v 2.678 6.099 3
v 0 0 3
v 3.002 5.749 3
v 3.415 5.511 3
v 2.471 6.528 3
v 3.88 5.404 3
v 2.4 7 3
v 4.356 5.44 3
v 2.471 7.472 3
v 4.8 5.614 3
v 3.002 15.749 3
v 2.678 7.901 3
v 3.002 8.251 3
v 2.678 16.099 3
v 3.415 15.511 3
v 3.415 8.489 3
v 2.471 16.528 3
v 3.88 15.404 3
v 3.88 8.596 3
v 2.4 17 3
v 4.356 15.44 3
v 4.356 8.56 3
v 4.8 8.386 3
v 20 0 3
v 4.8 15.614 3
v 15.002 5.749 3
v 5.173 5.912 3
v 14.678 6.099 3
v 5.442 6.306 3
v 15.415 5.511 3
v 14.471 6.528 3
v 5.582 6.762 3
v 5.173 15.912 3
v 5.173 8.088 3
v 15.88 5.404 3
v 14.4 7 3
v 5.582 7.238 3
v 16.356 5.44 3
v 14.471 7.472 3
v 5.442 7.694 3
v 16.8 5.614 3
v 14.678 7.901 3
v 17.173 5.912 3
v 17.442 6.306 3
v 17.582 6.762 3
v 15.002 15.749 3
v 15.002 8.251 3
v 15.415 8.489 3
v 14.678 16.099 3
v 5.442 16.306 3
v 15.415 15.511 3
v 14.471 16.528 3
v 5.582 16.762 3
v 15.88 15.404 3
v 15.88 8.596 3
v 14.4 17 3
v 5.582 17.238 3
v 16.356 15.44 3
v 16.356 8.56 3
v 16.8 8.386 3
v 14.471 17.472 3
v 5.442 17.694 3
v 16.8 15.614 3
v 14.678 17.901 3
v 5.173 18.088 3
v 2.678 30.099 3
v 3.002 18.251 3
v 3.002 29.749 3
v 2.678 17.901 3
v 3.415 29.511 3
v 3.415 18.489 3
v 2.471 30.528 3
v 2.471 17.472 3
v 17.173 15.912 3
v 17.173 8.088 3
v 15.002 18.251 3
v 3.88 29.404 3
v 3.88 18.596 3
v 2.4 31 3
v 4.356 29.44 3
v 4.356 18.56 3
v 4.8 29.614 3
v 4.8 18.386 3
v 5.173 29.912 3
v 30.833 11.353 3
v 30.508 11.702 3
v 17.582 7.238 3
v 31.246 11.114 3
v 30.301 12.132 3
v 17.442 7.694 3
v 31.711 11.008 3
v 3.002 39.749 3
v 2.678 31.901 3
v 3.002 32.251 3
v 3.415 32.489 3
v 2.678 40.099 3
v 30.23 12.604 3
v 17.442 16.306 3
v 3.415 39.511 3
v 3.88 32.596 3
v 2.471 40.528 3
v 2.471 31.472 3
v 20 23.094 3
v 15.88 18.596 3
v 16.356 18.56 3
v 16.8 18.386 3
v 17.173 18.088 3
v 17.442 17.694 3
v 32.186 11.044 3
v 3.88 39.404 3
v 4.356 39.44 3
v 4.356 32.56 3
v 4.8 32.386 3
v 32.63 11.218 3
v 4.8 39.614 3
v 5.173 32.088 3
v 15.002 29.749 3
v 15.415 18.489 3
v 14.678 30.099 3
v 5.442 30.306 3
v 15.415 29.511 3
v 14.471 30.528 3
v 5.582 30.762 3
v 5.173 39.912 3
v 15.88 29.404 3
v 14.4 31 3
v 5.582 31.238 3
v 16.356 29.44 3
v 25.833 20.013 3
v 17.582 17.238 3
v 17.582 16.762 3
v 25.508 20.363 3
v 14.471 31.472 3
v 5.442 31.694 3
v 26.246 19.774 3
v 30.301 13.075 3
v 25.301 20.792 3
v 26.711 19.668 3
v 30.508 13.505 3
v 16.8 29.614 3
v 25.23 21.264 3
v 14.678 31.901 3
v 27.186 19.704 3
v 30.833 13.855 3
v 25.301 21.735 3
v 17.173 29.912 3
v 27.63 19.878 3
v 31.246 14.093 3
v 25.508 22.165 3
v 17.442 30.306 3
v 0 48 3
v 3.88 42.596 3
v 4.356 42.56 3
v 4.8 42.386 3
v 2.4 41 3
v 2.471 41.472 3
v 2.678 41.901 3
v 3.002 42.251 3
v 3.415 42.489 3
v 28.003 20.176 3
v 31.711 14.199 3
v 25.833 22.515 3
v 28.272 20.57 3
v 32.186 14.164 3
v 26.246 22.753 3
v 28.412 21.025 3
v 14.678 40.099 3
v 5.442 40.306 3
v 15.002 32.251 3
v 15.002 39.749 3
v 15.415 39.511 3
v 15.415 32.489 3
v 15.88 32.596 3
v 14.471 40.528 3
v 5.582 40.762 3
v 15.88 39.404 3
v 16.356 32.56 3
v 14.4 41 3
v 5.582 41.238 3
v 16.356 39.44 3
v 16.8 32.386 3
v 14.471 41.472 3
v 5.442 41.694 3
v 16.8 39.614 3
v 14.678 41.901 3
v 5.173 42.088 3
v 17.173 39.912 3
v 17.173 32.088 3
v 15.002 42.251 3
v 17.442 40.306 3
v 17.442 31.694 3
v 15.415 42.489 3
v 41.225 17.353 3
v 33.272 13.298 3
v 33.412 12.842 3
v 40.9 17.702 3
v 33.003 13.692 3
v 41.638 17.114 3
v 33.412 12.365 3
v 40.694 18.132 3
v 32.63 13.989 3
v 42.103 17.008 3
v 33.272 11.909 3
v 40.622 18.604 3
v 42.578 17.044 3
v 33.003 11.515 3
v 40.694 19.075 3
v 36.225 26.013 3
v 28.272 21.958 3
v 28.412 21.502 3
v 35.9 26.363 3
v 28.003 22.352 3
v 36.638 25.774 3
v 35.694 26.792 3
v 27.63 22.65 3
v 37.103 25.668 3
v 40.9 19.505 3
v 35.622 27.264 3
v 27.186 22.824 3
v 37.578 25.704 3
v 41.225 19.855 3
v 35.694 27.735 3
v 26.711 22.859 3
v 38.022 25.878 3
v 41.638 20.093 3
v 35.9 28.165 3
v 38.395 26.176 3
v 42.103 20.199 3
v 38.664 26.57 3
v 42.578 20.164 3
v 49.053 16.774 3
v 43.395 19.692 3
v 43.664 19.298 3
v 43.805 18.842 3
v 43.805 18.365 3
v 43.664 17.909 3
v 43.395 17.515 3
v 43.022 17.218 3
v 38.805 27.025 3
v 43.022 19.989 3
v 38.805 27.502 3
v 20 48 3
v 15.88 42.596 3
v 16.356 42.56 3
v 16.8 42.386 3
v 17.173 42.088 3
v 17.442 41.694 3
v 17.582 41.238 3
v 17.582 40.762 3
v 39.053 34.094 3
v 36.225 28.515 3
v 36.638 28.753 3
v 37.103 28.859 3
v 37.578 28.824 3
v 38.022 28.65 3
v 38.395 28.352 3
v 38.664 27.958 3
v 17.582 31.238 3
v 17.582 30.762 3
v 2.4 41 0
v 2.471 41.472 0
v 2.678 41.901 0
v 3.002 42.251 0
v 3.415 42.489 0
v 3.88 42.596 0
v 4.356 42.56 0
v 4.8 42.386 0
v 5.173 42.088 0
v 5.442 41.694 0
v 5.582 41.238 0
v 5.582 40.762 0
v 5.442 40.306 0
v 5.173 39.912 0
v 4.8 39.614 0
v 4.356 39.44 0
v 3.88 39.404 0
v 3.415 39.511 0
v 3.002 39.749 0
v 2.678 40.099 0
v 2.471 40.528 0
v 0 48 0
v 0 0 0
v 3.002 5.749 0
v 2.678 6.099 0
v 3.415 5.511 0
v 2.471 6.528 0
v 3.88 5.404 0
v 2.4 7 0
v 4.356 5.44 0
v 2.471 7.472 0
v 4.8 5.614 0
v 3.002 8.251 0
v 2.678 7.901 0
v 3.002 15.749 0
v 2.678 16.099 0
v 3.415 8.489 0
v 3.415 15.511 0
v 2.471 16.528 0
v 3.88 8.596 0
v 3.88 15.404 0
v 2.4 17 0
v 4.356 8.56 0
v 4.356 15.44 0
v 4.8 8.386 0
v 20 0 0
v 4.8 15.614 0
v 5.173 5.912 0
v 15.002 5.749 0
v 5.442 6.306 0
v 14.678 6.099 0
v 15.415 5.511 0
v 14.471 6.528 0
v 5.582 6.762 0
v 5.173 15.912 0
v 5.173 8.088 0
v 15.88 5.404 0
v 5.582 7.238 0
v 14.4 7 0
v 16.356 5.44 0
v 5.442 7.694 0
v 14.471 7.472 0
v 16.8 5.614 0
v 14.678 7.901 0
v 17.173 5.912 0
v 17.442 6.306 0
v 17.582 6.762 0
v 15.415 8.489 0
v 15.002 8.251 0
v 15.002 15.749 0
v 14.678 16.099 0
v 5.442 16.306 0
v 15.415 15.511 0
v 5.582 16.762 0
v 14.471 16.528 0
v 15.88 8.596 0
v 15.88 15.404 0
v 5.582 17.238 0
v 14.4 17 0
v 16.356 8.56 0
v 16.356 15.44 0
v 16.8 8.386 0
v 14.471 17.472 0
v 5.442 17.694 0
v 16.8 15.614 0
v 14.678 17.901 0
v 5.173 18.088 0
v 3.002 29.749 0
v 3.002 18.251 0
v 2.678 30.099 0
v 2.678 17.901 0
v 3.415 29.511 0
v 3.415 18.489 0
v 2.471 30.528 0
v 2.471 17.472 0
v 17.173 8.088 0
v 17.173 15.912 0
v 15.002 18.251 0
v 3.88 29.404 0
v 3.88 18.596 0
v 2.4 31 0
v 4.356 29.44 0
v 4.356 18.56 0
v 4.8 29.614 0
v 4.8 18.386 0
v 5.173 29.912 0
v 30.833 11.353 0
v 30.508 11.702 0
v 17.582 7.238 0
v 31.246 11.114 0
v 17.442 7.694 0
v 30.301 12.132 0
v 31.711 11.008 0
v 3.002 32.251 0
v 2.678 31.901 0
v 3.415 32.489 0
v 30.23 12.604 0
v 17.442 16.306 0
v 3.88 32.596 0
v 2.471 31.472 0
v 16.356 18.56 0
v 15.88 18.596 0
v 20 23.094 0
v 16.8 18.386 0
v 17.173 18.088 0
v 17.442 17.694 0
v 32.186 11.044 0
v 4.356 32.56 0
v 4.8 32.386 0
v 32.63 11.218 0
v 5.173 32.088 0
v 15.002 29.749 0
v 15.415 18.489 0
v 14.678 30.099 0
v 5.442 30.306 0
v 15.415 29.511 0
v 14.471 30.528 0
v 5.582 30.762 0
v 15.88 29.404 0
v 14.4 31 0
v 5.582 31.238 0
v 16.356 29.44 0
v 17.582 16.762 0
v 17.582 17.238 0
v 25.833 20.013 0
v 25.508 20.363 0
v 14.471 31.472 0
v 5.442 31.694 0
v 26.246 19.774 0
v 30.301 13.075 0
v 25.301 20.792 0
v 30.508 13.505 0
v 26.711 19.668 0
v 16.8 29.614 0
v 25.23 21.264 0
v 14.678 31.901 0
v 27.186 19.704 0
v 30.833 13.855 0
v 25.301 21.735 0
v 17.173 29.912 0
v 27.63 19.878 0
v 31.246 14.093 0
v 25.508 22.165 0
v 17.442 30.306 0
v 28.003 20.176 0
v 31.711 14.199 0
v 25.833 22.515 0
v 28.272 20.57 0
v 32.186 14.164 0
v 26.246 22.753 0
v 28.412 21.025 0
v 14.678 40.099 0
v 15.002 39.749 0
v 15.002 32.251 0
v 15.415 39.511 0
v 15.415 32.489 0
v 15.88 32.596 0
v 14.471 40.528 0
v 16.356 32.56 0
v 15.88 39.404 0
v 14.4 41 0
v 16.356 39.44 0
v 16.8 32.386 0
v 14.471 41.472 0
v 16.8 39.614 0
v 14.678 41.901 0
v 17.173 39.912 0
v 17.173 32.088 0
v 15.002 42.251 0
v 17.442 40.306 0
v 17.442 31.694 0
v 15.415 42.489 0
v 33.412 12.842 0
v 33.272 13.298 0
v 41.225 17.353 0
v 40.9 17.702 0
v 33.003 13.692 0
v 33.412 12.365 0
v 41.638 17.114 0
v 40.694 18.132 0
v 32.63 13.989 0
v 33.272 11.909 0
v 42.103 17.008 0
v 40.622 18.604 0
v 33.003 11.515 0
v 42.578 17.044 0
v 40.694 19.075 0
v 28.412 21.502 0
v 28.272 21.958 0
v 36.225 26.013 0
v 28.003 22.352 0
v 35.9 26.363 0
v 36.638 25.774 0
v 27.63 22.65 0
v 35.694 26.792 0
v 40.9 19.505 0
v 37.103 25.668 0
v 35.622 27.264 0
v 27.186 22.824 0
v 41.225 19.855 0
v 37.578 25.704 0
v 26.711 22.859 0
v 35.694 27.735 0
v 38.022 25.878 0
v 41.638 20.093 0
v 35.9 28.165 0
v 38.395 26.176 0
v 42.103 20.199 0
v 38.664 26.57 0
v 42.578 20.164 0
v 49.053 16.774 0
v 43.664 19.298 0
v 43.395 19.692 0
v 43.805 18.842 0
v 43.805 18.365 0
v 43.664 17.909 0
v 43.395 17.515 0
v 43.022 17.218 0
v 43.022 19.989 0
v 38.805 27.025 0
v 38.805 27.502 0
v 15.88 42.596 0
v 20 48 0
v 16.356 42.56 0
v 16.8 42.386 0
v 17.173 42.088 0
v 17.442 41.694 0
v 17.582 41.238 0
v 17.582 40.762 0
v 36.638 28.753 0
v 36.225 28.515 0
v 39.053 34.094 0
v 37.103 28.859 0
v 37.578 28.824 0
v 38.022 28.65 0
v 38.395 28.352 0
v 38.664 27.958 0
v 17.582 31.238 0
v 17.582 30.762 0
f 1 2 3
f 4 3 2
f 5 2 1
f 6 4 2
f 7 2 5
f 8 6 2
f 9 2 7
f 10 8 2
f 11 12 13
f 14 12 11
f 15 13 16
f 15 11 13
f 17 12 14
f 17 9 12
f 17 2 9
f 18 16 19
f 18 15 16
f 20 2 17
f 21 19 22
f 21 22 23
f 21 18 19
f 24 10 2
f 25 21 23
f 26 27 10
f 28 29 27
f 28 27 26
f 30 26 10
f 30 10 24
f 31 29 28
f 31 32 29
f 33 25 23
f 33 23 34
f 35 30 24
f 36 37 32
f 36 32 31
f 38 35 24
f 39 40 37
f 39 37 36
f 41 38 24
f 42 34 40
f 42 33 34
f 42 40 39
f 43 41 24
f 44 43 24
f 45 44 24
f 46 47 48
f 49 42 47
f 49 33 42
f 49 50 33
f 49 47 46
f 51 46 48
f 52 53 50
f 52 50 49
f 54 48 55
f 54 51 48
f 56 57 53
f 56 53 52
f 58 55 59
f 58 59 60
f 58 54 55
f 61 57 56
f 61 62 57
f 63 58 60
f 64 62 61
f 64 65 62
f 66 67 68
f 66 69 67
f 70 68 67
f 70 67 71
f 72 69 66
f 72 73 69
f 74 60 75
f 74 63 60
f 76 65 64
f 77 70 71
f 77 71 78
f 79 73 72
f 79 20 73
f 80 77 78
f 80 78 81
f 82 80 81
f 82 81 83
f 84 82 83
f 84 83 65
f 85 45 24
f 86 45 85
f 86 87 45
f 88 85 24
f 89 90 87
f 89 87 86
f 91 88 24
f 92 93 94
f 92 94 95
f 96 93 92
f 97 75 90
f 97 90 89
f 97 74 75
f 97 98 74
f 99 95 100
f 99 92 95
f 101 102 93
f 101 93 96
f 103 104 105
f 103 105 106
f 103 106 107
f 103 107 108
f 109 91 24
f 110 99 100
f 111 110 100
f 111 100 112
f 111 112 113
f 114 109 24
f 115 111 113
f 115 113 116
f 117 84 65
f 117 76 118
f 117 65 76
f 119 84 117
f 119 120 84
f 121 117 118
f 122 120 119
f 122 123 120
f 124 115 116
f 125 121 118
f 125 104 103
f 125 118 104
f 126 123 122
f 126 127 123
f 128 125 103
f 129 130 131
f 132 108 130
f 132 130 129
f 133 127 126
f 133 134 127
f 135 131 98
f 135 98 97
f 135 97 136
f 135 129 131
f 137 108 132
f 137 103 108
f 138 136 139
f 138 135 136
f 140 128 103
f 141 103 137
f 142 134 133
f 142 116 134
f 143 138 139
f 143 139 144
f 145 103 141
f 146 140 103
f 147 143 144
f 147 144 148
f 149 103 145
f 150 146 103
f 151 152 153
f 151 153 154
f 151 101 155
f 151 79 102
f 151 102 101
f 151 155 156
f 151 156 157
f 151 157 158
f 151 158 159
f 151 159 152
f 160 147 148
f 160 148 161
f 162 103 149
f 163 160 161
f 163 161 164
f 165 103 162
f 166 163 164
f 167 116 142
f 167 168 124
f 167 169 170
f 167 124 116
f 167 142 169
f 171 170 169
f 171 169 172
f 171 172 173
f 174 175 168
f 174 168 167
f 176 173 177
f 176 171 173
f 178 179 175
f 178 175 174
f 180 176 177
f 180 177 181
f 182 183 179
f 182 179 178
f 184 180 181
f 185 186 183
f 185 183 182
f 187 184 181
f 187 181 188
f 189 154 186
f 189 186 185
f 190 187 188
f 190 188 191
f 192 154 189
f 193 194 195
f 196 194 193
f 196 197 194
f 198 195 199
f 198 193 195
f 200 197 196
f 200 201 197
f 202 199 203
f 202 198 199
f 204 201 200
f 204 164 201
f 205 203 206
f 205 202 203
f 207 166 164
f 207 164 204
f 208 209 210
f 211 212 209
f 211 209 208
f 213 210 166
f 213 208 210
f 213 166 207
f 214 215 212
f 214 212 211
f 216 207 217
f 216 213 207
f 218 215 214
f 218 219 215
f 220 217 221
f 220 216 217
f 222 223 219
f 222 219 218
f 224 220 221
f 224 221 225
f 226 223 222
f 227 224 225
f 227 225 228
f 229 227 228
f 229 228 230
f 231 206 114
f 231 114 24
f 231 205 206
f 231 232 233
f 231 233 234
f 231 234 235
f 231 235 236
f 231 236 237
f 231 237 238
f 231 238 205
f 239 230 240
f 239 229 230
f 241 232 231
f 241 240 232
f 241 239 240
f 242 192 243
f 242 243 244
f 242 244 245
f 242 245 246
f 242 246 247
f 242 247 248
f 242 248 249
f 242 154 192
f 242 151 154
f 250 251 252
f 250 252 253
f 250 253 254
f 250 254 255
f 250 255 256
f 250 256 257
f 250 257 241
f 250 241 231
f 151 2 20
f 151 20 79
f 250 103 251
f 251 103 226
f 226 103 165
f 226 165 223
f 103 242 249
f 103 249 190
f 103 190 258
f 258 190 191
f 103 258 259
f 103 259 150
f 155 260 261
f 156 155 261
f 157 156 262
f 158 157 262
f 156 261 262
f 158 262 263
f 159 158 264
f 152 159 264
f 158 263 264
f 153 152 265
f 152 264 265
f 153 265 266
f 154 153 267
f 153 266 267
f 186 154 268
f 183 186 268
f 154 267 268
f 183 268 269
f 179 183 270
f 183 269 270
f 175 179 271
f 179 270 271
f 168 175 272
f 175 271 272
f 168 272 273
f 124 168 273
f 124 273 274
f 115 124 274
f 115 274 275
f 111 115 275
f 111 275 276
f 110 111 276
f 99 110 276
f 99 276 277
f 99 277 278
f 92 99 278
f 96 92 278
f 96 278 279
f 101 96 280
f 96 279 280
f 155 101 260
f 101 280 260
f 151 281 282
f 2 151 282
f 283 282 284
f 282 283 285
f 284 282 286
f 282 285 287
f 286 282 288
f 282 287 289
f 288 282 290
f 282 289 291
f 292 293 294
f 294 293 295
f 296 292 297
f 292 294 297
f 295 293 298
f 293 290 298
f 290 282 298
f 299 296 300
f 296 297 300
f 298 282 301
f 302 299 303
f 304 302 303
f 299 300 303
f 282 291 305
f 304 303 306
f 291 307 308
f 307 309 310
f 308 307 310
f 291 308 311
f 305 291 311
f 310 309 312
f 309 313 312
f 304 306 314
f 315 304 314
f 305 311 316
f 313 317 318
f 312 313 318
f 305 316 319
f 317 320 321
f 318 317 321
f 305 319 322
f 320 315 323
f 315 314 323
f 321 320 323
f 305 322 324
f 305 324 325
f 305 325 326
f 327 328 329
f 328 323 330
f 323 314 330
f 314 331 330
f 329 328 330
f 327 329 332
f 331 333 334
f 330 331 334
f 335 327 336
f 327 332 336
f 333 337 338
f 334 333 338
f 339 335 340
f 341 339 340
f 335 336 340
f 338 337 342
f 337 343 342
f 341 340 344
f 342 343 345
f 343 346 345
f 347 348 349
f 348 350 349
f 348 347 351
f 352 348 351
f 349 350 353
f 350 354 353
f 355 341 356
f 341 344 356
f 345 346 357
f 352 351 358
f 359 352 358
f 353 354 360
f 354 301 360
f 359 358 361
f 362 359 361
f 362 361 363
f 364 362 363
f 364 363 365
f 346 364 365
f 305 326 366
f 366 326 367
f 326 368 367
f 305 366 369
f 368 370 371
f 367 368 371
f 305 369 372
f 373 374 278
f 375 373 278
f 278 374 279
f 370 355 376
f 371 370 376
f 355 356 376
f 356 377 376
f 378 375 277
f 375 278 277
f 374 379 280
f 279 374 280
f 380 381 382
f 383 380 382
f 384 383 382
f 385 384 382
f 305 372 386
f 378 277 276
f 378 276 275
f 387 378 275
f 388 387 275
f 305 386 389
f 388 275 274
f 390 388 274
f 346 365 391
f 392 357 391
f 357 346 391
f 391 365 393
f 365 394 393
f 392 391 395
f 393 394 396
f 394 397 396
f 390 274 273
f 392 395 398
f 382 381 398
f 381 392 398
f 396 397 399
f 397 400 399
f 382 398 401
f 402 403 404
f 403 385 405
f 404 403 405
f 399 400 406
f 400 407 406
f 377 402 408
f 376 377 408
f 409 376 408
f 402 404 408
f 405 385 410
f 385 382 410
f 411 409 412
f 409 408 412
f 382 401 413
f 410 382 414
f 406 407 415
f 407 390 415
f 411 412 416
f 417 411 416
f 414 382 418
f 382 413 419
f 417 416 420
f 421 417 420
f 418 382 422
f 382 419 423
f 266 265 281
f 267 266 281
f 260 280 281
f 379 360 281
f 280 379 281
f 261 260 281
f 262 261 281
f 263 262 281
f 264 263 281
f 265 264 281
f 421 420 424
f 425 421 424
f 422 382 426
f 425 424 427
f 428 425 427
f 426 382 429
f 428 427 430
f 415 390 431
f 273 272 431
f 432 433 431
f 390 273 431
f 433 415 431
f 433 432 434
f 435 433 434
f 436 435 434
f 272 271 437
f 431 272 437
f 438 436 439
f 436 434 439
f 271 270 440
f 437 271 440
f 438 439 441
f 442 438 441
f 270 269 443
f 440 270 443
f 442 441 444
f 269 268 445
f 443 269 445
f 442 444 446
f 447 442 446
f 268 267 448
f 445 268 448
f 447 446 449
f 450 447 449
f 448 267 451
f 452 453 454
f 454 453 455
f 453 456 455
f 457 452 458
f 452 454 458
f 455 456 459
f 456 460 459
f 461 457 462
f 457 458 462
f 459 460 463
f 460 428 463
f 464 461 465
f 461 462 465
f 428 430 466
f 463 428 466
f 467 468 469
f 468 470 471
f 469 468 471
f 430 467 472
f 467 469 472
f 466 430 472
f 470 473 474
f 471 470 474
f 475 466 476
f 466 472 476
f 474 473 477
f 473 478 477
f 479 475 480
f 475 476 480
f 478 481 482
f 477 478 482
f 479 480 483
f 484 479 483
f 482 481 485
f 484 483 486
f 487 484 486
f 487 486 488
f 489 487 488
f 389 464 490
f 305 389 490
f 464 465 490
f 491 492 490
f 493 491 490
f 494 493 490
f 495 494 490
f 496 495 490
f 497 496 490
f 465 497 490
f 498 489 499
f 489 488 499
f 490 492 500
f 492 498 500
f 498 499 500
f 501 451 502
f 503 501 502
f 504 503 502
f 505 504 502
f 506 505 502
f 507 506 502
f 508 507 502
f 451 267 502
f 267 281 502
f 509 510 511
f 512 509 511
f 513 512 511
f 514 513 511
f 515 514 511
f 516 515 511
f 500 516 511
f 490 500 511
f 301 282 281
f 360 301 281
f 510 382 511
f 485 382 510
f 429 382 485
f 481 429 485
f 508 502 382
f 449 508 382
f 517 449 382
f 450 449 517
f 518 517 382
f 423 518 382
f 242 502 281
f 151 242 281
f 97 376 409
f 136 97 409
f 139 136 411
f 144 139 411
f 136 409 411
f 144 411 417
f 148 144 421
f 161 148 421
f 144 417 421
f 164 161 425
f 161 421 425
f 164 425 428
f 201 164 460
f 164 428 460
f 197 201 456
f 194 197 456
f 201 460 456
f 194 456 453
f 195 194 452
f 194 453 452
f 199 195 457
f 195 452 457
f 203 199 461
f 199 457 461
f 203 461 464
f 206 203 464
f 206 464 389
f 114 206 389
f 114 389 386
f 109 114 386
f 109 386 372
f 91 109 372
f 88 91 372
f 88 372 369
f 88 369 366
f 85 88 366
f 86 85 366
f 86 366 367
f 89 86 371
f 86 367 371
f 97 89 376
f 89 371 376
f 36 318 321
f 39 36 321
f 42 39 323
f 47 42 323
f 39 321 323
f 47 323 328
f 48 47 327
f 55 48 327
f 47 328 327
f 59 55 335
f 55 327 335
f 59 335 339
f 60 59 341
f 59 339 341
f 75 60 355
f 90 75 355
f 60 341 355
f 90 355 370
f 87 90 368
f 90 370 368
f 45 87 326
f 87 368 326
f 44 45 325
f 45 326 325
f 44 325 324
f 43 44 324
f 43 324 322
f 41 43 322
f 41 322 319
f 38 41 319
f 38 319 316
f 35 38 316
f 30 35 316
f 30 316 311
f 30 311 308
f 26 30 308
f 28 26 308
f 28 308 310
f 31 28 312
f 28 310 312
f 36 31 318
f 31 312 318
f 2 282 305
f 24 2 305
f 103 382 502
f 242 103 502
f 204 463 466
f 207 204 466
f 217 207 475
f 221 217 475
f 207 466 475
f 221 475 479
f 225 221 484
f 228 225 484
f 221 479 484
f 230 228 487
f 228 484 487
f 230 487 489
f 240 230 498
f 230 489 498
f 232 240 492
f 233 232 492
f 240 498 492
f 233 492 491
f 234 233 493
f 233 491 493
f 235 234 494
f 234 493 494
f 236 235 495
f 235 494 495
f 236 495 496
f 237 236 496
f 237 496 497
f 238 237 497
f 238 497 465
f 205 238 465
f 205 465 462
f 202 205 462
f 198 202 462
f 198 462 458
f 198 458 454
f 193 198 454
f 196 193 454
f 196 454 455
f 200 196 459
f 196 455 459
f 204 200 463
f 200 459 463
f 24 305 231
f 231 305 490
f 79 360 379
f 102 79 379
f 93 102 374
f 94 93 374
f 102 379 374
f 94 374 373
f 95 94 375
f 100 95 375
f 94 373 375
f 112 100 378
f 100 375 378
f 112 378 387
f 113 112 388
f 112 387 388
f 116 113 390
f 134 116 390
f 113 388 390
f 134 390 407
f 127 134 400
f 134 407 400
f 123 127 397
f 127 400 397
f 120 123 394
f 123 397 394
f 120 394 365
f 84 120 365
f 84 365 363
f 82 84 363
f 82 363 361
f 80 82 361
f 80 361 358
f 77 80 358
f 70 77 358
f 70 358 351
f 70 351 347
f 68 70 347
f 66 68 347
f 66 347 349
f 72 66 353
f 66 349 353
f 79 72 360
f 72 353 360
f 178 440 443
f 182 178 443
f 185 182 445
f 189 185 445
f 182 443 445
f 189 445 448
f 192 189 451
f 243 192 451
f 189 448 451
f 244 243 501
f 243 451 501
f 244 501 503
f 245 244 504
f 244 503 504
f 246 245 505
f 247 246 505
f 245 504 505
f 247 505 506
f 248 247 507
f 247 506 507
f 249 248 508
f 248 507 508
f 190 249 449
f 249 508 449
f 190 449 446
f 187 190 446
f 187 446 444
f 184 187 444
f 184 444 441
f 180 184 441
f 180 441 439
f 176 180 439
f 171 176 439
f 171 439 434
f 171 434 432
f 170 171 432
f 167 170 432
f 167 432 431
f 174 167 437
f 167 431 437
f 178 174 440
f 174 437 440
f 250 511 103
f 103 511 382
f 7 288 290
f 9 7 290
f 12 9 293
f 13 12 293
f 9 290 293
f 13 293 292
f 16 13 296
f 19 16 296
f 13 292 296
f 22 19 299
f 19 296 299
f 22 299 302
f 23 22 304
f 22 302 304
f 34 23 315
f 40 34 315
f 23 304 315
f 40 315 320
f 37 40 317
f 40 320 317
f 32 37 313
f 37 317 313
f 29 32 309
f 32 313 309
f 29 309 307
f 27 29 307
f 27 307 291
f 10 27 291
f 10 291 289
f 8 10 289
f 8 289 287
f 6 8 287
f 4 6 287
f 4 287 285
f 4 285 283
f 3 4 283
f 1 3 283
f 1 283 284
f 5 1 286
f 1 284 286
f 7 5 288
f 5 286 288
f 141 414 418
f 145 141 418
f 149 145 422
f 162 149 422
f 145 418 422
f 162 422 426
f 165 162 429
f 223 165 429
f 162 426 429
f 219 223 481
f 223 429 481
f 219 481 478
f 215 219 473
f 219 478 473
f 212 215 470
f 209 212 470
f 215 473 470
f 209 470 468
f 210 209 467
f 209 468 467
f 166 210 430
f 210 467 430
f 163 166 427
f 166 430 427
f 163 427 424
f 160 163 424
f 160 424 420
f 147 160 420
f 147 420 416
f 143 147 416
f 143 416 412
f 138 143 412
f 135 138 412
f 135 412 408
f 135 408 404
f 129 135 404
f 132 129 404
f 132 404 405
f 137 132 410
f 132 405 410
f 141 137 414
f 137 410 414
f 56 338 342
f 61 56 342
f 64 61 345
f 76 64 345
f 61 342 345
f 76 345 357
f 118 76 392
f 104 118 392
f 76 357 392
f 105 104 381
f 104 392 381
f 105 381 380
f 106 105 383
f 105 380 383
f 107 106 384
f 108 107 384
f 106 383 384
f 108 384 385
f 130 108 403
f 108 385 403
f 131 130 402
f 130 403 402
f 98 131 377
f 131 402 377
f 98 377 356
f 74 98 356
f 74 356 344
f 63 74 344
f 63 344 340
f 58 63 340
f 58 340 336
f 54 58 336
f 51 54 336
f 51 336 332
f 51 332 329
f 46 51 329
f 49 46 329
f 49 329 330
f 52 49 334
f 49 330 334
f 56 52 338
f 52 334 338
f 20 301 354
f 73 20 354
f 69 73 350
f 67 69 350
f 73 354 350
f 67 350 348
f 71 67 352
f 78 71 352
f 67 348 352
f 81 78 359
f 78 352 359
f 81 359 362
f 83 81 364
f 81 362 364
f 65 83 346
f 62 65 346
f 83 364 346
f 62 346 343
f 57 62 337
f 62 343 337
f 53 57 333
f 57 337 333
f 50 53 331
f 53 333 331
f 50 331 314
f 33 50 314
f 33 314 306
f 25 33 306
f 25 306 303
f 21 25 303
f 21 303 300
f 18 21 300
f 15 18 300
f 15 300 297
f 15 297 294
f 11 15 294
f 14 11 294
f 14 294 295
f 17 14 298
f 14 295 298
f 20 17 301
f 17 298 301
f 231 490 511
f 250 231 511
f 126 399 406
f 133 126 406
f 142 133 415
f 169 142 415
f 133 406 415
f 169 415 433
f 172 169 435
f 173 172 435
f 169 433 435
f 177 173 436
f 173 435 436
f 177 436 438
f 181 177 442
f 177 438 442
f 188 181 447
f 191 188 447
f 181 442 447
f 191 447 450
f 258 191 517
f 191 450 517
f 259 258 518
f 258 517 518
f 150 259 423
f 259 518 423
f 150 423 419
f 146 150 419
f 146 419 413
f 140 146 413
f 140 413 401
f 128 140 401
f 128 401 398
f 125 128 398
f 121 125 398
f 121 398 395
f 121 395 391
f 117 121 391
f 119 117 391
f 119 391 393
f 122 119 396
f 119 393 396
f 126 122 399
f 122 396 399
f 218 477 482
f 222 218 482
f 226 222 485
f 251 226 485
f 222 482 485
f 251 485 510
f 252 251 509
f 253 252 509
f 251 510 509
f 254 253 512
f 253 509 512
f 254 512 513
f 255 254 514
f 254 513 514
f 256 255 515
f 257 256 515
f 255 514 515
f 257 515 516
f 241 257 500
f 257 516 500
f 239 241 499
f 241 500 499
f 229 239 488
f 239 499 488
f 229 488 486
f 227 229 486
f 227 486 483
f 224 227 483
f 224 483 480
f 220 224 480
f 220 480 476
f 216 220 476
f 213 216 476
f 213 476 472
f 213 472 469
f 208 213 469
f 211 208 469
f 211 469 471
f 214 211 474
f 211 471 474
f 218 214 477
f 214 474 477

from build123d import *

# Parameters (mm, degrees)
EXTRUDE_1_DEPTH     = 3
SKETCH_2_R          = 1.6
CUT_EXTRUDE_1_DEPTH = 3


with BuildPart() as part:
    # 草图1 → 凸台-拉伸1 (new body)
    with BuildSketch(Plane.XY):
        Polygon((0, 48), (0, 0), (20, 0), (49.052558883, 16.773502692), (39.052558883, 34.094010768), (20, 23.094010768), (20, 48), align=None)
    extrude(amount=EXTRUDE_1_DEPTH)

    # 草图2 → 切除-拉伸1 (cut)
    with BuildSketch(Plane(origin=(0, 0, 0), x_dir=(-1, 0, 0), z_dir=(0, 0, -1))):
        with Locations((-42.222431864, 18.603629711)):
            Circle(SKETCH_2_R)
        with Locations((-37.222431864, 27.263883749)):
            Circle(SKETCH_2_R)
        with Locations((-26.830127019, 21.263883749)):
            Circle(SKETCH_2_R)
        with Locations((-31.830127019, 12.603629711)):
            Circle(SKETCH_2_R)
        with Locations((-16, 7)):
            Circle(SKETCH_2_R)
        with Locations((-16, 17)):
            Circle(SKETCH_2_R)
        with Locations((-4, 7)):
            Circle(SKETCH_2_R)
        with Locations((-4, 17)):
            Circle(SKETCH_2_R)
        with Locations((-16, 31)):
            Circle(SKETCH_2_R)
        with Locations((-16, 41)):
            Circle(SKETCH_2_R)
        with Locations((-4, 31)):
            Circle(SKETCH_2_R)
        with Locations((-4, 41)):
            Circle(SKETCH_2_R)
    extrude(amount=-CUT_EXTRUDE_1_DEPTH, mode=Mode.SUBTRACT)


solid = part.part
